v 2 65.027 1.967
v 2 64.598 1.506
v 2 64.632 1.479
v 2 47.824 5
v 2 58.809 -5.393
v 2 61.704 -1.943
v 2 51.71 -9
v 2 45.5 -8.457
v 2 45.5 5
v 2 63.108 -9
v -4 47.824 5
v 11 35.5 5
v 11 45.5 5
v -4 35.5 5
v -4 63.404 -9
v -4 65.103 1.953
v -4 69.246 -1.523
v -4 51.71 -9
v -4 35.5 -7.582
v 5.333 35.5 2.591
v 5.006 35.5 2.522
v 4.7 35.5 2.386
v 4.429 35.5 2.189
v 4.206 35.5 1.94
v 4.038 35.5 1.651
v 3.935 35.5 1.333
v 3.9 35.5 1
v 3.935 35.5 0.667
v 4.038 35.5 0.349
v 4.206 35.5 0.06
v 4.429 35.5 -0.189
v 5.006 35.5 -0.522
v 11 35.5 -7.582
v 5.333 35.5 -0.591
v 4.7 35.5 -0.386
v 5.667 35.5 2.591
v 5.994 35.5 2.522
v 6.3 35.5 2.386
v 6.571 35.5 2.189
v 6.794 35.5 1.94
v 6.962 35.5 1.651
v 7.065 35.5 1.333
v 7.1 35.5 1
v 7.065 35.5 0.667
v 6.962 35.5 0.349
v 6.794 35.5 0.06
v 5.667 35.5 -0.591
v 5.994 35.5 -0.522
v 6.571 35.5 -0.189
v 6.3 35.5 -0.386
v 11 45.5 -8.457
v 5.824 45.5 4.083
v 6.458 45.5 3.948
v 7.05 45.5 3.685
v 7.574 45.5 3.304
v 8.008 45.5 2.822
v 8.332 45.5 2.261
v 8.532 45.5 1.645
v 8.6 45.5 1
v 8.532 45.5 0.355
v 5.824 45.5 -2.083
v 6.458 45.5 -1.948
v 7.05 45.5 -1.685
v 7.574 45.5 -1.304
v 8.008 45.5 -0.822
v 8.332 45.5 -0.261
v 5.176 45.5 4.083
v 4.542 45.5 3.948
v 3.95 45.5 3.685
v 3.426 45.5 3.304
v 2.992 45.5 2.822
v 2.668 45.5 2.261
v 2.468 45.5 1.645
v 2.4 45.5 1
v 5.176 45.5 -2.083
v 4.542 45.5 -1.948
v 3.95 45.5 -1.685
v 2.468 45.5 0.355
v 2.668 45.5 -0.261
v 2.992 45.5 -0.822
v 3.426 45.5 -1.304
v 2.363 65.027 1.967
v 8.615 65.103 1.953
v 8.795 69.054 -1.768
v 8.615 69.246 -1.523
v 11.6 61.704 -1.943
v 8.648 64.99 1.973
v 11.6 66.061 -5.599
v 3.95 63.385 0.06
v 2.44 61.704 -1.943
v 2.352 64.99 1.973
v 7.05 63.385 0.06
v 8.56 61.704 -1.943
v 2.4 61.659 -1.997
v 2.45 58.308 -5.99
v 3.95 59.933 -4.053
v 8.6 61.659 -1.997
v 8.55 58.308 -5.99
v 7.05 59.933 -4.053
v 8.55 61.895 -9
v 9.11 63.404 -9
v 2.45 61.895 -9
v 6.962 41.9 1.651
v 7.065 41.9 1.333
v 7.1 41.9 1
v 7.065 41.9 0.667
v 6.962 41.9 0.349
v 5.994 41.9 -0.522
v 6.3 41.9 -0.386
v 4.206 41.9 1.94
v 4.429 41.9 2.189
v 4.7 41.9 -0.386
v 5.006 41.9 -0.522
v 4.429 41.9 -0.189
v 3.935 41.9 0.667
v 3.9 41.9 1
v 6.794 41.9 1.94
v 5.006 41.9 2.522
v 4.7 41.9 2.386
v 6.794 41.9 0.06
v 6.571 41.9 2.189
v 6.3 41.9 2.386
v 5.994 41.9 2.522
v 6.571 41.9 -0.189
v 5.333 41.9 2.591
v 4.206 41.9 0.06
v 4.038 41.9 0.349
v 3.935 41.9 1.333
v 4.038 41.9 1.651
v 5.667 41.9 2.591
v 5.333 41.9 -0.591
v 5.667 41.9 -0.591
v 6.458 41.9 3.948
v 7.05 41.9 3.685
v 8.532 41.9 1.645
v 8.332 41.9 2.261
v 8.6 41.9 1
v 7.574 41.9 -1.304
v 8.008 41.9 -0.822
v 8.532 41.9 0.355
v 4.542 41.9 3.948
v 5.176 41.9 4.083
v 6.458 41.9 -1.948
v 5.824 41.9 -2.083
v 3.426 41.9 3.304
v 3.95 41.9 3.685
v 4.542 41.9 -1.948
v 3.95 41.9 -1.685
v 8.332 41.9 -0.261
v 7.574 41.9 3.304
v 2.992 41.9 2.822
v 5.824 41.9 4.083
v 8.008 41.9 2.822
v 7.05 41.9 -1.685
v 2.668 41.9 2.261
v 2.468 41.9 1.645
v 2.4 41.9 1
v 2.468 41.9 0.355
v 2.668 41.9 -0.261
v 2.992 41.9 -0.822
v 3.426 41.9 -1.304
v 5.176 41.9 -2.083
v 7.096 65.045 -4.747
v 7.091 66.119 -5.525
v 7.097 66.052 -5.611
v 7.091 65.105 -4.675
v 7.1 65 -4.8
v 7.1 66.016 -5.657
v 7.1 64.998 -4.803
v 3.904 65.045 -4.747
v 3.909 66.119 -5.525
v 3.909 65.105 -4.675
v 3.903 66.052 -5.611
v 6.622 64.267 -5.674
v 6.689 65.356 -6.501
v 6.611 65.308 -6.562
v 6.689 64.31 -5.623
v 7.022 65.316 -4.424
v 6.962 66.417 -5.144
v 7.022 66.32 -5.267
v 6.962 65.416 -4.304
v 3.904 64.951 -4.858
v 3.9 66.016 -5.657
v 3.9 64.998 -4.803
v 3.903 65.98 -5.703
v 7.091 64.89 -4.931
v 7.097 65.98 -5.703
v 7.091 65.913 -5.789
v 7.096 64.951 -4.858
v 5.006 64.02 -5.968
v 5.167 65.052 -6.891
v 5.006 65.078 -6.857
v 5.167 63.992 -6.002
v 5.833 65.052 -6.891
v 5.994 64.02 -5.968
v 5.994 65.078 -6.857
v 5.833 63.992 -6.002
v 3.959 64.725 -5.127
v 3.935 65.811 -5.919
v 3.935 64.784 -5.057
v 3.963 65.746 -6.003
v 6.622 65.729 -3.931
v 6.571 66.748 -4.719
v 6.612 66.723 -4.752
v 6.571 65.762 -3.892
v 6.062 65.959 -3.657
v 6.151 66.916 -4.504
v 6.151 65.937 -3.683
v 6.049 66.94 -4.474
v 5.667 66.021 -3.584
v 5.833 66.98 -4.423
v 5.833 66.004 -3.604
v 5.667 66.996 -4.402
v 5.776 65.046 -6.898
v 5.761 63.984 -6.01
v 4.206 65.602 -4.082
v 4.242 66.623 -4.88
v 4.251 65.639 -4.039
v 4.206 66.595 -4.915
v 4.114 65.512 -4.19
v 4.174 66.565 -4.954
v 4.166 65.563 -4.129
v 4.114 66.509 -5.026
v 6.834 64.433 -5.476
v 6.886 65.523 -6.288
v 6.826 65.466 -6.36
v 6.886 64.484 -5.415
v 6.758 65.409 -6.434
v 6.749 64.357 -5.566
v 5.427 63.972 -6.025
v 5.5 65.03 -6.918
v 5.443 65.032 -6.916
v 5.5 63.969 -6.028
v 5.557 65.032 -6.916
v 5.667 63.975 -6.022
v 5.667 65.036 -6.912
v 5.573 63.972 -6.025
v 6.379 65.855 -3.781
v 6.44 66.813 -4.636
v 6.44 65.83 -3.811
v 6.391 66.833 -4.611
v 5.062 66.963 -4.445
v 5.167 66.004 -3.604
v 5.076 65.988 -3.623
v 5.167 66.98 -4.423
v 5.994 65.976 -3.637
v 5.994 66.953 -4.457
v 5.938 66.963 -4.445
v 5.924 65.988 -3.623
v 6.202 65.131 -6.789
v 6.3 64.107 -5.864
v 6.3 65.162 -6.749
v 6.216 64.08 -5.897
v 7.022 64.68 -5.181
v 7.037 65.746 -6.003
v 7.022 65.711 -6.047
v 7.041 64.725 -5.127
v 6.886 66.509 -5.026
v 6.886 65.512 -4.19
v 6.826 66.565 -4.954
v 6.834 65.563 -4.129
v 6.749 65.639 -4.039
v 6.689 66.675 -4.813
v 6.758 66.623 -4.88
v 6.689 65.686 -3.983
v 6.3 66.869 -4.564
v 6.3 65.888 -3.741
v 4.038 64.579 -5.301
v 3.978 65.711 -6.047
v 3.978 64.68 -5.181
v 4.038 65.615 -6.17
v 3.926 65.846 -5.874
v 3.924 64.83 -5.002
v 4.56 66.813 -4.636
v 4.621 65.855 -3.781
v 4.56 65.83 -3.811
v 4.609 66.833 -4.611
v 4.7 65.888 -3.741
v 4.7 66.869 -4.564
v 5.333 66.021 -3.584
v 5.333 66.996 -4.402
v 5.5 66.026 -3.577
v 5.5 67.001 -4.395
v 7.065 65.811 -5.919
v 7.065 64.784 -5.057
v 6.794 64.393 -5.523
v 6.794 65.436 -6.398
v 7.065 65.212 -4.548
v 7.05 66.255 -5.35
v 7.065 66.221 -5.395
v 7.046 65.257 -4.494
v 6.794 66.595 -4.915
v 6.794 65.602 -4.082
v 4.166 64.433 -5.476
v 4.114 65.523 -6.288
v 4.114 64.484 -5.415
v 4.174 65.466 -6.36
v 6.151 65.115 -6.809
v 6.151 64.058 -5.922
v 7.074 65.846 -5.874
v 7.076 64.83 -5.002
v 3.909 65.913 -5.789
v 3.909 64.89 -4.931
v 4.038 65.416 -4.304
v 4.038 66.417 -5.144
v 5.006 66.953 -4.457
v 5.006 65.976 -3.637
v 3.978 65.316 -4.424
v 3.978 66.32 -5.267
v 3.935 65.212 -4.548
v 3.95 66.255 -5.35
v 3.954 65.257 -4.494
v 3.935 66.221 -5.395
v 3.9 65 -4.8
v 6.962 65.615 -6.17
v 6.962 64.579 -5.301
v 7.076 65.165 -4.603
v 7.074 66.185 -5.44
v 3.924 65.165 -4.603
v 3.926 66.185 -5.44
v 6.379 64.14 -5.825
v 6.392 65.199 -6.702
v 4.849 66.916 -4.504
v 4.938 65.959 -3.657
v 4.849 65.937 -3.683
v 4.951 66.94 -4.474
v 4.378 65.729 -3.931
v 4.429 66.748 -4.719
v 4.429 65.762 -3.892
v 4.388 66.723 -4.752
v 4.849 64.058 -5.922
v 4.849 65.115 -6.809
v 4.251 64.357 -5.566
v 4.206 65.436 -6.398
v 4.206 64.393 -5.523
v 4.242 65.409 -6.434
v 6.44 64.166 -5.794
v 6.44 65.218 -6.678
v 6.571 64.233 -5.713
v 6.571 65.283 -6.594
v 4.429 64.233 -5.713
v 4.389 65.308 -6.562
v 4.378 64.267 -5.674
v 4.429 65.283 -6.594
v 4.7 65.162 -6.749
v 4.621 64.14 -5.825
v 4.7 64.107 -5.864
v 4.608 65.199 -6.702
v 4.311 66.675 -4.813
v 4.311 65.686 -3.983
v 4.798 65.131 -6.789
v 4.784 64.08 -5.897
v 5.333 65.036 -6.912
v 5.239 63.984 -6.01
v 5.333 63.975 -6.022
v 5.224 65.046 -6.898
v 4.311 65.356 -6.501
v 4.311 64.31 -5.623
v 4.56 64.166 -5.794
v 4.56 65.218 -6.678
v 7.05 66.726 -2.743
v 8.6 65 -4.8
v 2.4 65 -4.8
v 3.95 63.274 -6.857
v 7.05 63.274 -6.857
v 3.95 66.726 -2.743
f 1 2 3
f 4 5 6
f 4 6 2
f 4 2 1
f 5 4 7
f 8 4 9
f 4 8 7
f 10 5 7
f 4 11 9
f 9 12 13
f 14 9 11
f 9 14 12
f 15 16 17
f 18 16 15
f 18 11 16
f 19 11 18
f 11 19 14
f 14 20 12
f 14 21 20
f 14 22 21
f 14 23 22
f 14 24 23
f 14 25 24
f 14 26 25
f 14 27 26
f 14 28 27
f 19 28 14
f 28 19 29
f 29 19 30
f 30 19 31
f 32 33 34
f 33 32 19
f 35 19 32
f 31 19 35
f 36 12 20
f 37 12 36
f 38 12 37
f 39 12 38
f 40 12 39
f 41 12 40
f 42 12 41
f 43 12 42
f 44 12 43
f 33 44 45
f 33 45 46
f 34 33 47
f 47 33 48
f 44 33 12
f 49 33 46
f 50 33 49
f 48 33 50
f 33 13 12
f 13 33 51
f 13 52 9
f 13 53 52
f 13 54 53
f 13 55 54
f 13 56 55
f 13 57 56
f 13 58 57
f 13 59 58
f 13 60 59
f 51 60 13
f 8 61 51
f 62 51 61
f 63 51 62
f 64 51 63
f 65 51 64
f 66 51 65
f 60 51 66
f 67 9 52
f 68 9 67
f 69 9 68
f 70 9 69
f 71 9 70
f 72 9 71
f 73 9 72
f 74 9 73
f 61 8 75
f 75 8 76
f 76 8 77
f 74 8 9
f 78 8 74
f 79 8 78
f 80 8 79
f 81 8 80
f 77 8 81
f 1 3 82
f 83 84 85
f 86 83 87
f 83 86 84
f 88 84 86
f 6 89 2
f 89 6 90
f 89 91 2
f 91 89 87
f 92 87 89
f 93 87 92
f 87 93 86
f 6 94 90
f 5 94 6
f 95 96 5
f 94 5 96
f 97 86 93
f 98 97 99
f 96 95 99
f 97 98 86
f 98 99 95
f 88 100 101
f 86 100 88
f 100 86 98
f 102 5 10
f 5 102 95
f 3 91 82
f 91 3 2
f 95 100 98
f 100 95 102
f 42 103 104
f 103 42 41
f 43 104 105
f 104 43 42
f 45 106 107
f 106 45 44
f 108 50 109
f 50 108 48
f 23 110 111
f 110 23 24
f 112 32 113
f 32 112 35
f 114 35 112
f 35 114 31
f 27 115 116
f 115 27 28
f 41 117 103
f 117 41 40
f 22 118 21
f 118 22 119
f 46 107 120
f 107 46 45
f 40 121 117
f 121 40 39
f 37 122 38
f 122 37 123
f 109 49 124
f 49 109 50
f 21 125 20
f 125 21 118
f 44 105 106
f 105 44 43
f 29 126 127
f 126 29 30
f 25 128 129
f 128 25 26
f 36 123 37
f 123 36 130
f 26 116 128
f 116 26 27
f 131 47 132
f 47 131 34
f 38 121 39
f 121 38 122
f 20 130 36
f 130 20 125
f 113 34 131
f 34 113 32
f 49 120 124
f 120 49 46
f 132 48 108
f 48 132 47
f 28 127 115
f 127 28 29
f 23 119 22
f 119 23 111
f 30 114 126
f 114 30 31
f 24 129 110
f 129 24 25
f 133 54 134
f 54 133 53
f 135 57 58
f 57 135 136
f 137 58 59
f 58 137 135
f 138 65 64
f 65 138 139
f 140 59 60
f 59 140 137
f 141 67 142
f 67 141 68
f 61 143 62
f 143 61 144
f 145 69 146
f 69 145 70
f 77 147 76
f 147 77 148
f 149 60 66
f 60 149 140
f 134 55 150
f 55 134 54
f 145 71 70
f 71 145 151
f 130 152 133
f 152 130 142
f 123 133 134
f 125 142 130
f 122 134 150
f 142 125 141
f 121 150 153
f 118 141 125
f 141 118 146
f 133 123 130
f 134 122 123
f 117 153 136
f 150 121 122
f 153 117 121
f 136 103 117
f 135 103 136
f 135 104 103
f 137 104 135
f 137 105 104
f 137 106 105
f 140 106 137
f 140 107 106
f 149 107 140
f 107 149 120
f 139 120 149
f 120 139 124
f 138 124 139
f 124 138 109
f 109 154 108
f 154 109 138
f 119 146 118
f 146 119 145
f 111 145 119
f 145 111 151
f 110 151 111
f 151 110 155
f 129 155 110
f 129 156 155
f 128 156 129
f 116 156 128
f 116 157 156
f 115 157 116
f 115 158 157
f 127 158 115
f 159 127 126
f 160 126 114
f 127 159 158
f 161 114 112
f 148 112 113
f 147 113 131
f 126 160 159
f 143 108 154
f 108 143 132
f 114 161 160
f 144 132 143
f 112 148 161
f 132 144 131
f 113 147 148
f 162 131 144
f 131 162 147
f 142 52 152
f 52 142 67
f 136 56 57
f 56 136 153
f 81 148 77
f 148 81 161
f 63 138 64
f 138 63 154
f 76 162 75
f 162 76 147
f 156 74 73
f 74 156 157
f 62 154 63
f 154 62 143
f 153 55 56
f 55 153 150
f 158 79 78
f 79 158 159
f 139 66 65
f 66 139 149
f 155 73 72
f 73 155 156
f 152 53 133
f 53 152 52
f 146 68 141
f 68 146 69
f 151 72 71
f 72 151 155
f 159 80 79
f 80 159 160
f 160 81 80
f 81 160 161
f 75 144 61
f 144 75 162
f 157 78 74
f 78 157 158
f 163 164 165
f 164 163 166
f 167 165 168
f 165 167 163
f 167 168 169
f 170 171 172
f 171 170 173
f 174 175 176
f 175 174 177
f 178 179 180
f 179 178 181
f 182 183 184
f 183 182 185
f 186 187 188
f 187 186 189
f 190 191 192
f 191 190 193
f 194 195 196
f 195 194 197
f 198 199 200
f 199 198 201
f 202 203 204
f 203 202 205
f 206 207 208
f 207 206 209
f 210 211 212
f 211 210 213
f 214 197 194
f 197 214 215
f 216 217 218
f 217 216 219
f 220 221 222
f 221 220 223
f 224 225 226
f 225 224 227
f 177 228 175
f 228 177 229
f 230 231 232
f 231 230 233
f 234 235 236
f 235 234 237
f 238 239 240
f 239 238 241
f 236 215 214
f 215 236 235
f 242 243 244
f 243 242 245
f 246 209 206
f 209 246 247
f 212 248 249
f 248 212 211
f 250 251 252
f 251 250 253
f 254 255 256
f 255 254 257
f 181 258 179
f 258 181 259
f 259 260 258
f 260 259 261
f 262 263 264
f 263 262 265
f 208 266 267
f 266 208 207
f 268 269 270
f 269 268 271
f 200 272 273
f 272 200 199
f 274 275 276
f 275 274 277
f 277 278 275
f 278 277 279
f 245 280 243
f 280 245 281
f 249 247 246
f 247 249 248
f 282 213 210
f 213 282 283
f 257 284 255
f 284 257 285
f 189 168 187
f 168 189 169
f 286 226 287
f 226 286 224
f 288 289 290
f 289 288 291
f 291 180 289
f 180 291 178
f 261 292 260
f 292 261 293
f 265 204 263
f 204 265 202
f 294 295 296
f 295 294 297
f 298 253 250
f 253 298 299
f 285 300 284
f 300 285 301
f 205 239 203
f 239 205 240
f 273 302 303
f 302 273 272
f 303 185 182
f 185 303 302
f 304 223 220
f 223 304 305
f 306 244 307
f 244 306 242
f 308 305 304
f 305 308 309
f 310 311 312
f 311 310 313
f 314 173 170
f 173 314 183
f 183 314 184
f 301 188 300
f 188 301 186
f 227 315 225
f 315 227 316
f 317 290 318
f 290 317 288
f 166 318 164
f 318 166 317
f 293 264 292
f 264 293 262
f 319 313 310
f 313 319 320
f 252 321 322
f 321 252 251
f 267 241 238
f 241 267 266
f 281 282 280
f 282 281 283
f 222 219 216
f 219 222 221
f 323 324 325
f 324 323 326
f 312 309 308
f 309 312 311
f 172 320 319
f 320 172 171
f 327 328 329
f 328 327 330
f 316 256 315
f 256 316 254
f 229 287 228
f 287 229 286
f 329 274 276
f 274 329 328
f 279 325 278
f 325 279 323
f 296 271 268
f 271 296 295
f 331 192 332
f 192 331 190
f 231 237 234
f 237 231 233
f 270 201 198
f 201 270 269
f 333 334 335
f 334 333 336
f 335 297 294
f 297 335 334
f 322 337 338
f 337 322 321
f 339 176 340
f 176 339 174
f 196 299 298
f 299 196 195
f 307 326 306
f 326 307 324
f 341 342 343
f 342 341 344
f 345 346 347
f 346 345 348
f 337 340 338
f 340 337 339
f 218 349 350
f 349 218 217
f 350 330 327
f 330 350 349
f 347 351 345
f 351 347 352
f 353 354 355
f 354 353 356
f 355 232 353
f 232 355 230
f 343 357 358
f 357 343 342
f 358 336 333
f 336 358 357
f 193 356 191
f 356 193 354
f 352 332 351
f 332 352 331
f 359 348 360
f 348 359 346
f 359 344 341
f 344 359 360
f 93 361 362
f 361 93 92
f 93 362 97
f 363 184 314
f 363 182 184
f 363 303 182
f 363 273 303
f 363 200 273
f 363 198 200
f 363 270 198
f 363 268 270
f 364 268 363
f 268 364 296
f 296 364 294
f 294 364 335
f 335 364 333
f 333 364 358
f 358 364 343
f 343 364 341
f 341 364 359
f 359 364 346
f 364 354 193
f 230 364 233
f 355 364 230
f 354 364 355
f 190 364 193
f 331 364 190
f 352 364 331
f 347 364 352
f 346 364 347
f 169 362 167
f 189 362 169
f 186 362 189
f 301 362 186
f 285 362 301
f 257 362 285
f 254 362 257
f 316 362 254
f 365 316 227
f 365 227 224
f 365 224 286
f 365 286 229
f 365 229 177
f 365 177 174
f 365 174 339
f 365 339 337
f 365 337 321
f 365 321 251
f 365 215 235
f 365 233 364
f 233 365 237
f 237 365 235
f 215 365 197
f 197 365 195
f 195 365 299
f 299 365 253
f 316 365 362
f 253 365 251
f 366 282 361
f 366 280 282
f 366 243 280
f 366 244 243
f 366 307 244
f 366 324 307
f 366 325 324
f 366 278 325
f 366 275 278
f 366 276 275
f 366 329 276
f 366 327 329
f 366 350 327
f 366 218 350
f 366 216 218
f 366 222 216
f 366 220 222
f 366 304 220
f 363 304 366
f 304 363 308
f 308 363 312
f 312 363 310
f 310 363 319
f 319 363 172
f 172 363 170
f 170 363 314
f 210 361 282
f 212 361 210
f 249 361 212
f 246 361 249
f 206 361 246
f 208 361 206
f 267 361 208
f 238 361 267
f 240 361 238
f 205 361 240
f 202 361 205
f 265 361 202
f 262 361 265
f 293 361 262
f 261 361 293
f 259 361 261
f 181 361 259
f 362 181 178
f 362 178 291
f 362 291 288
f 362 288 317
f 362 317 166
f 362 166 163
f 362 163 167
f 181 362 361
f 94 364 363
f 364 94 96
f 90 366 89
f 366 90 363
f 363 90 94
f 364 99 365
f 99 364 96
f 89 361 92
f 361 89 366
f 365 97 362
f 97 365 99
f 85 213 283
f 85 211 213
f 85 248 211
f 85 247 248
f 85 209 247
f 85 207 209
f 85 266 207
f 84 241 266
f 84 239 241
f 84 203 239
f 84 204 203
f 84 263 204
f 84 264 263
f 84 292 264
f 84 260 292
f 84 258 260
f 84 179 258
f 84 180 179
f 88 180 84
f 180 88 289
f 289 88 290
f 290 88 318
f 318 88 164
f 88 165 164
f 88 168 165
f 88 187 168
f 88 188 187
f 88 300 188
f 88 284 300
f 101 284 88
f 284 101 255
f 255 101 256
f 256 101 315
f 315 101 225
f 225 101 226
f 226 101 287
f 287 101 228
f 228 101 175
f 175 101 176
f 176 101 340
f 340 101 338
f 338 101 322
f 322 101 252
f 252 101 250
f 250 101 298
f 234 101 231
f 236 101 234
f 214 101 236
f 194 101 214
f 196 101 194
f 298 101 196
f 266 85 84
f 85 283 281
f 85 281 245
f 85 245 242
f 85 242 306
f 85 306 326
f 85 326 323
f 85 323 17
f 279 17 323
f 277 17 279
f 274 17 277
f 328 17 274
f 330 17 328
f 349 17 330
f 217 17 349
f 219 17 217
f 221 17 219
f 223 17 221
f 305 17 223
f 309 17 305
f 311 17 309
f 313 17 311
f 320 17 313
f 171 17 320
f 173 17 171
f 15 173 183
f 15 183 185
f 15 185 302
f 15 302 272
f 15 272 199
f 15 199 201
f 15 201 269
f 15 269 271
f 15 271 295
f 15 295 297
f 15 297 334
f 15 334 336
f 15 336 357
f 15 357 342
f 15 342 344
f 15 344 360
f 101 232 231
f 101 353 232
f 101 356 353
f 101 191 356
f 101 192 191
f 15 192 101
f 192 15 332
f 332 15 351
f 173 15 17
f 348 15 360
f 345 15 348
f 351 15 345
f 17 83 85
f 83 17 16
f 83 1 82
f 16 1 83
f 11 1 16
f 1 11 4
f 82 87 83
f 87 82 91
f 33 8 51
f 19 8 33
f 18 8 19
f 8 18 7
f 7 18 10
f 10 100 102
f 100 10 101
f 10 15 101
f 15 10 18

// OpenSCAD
//#import("nozzle-fan.stl");
//#translate([0,-4.5,0]) rotate([90,0,180]) import("extruder-body.stl");
//translate([0,-4.5,0]) rotate([90,0,0]) import("extruder-cover.stl");
//translate([0,0,0]) rotate([0,0,0]) import("hot21_45_2.stl");
//use<nozzle-fan-old.scad>;
//%rotate([90,0,0]) fan_nozzle_old();


difference()
{
union()
{
    translate([-4,35.5,-25]) cube([6,45,30]);
    translate([-4,35.5,-25]) cube([15,10,30]);
    translate([-4,68,-12]) rotate([51,0,0]) cube([10,15,11.1]);
    translate([5.5,66.3,-5.8]) rotate([50,0,0])  cylinder(r=6.1,h = 6, $fn=6);
}


translate([5.5,42,1]) rotate([90,0,0])  cylinder(r=1.6,h = 10, $fn=30);
translate([5.5,46.9,1]) rotate([90,0,0])  cylinder(r=3.1,h = 5, $fn=30);

//#translate([5.5,70,-7]) rotate([50,0,0])  cylinder(r=1.6,h = 15, $fn=60);
 translate([5.5,70,-9]) rotate([50,0,0])  cylinder(r=1.6,h = 15, $fn=60);
 translate([5.5,65,-4.8]) rotate([50,0,0])  cylinder(r=3.1,h = 17, $fn=6);


translate([-25,46.5,-55]) rotate([52,0,0]) cube([50,150,15]);
translate([-25,46.5,-66]) rotate([50,0,0]) cube([50,150,15]);
translate([-25,86,4]) rotate([50+90,0,0]) cube([50,150,15]);
translate([-25,86,13.5]) rotate([170,0,0]) cube([50,150,15]);
translate([-25,86,-12]) rotate([175,0,0]) cube([50,150,15]);

translate([-5,35,-25]) cube([20,45,16]);

}
